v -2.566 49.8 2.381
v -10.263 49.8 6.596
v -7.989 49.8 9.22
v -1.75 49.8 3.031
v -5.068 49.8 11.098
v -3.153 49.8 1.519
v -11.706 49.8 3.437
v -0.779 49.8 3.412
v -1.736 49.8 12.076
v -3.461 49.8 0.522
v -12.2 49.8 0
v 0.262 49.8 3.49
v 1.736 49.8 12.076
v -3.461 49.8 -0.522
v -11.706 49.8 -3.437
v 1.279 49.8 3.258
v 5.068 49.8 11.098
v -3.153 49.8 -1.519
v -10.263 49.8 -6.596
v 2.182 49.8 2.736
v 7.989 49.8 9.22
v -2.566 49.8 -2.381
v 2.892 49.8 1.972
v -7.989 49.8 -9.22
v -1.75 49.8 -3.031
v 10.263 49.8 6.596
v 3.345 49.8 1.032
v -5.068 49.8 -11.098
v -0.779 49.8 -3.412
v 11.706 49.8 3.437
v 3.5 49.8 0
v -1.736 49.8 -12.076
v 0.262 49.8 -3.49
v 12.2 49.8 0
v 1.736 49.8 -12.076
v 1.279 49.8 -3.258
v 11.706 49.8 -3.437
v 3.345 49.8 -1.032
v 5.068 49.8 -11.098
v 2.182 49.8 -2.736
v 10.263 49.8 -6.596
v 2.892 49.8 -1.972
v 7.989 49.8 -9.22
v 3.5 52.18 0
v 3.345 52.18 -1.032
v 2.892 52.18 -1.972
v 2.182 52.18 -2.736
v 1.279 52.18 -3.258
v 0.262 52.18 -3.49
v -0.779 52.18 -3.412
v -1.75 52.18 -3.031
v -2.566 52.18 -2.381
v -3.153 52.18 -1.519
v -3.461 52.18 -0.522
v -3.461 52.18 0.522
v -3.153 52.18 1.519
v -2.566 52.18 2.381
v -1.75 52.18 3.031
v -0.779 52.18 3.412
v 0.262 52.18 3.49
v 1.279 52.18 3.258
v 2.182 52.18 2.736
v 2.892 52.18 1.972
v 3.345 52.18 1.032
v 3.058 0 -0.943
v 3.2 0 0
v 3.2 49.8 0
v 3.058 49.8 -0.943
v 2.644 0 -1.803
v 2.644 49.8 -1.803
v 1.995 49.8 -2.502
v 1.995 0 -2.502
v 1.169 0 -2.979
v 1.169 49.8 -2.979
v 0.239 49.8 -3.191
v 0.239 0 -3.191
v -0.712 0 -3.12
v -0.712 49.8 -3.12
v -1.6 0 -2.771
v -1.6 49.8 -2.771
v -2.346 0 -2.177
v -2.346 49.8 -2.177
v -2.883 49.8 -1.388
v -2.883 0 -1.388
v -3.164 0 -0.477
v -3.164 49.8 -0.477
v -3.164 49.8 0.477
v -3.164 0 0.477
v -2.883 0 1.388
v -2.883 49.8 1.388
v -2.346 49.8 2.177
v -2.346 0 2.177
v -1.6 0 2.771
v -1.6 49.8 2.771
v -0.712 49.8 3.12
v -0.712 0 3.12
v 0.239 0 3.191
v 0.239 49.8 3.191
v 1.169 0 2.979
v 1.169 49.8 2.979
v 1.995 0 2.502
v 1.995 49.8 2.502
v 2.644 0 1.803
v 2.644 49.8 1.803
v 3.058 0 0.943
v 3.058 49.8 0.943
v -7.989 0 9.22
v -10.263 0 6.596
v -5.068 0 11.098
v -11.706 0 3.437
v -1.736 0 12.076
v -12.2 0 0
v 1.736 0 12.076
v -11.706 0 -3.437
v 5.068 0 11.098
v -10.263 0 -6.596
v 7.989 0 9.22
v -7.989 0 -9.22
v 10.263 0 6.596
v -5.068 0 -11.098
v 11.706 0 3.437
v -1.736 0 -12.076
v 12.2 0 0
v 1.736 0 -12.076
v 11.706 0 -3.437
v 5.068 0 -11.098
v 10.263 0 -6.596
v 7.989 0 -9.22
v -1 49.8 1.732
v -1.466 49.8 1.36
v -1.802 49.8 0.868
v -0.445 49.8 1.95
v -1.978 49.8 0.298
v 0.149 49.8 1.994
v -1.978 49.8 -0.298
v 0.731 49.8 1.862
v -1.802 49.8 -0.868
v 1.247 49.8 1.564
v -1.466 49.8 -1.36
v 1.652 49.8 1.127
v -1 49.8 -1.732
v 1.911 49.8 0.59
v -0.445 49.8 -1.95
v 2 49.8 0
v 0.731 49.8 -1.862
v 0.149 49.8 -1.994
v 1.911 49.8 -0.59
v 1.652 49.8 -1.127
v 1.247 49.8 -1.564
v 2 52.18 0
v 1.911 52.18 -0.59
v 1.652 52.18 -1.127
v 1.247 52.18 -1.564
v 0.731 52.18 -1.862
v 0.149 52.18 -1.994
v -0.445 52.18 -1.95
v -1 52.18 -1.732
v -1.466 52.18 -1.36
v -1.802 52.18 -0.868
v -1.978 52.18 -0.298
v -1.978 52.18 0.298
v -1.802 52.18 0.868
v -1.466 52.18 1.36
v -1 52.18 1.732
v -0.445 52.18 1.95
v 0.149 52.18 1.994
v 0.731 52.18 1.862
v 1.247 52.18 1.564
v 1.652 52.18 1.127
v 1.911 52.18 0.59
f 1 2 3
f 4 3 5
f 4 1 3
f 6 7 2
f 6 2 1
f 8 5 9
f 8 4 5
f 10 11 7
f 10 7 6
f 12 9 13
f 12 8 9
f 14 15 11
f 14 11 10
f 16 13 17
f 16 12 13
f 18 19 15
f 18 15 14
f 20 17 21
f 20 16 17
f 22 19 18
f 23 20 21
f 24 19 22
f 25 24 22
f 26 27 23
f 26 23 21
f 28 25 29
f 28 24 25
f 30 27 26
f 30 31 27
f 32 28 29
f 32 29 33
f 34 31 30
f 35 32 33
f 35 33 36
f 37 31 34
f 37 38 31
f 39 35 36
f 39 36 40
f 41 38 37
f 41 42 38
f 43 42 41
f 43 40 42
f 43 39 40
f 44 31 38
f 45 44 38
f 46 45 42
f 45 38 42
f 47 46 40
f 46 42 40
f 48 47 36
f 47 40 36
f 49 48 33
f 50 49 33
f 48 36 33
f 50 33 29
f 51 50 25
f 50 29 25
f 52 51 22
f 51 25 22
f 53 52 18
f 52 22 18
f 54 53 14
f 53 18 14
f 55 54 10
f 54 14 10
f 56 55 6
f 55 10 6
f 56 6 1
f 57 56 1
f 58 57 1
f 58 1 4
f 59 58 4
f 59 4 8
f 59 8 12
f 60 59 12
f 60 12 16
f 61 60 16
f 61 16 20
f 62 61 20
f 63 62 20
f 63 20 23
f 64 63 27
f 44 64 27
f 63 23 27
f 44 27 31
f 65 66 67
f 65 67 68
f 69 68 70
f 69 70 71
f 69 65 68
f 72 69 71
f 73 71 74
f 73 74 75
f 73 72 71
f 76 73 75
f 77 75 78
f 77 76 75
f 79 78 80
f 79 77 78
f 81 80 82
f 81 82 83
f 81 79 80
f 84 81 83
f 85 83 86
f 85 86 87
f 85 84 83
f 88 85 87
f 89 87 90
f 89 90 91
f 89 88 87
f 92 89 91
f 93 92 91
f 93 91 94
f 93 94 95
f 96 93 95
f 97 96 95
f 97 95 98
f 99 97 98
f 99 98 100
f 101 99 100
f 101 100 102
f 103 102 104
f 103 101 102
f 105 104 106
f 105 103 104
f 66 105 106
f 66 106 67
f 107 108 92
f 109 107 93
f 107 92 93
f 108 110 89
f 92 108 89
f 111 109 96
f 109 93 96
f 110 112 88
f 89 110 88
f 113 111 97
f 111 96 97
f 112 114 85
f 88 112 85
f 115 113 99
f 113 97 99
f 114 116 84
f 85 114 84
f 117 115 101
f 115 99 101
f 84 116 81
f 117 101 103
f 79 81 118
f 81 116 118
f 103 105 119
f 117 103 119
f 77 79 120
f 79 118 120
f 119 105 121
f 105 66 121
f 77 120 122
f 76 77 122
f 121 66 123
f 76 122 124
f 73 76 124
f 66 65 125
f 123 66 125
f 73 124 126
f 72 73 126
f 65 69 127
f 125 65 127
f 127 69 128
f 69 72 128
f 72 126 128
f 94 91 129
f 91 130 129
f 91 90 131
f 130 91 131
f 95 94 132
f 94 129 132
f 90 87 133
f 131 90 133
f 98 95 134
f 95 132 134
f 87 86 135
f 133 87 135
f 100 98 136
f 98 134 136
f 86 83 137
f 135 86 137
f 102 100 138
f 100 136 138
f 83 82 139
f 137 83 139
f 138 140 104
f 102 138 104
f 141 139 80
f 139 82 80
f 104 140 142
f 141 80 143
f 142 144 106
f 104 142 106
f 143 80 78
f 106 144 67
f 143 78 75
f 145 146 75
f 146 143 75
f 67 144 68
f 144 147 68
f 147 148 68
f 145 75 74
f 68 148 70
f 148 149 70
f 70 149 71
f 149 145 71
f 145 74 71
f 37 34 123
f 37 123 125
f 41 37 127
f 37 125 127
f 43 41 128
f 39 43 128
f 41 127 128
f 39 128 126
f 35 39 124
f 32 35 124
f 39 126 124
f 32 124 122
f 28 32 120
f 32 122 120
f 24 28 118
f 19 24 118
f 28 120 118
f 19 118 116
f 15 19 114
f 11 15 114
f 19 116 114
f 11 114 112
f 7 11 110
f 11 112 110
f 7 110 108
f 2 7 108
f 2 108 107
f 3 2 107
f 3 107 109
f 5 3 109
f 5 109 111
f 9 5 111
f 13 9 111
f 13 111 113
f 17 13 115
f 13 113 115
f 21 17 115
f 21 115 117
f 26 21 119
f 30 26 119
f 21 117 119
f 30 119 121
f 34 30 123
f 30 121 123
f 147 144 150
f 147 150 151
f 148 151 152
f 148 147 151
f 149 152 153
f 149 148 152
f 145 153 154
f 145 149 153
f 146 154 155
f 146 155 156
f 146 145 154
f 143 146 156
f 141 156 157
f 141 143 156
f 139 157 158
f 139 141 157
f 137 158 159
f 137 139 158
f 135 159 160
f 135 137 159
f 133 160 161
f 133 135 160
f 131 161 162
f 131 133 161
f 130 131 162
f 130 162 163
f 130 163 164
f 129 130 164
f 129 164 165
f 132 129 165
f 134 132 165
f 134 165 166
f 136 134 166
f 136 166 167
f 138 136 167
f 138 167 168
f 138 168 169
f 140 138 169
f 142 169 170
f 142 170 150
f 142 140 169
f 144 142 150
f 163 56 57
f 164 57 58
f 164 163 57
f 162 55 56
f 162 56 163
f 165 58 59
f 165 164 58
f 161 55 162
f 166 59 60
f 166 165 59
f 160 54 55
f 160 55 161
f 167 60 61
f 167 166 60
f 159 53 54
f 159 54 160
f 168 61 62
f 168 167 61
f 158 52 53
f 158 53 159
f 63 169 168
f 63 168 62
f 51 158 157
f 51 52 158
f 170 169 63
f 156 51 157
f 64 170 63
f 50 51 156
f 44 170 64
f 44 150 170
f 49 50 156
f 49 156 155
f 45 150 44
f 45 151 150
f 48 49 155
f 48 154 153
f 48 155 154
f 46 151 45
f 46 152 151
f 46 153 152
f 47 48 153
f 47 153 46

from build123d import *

# Parameters (mm, degrees)
SKETCH3_R           = 12.2
SKETCH3_R_2         = 3.2
BOSS_EXTRUDE1_DEPTH = 49.8
SKETCH4_R           = 3.5
SKETCH4_R_2         = 2
BOSS_EXTRUDE2_DEPTH = 2.38


with BuildPart() as part:
    # Sketch3 → Boss-Extrude1 (new body)
    with BuildSketch(Plane(origin=(0, 0, 0), x_dir=(1, 0, 0), z_dir=(0, 1, 0))):
        Circle(SKETCH3_R)
        Circle(SKETCH3_R_2, mode=Mode.SUBTRACT)
    extrude(amount=BOSS_EXTRUDE1_DEPTH)

    # Sketch4 → Boss-Extrude2 (add)
    with BuildSketch(Plane(origin=(0, 49.8, 0), x_dir=(1, 0, 0), z_dir=(0, 1, 0))):
        Circle(SKETCH4_R)
        Circle(SKETCH4_R_2, mode=Mode.SUBTRACT)
    extrude(amount=BOSS_EXTRUDE2_DEPTH)


solid = part.part
